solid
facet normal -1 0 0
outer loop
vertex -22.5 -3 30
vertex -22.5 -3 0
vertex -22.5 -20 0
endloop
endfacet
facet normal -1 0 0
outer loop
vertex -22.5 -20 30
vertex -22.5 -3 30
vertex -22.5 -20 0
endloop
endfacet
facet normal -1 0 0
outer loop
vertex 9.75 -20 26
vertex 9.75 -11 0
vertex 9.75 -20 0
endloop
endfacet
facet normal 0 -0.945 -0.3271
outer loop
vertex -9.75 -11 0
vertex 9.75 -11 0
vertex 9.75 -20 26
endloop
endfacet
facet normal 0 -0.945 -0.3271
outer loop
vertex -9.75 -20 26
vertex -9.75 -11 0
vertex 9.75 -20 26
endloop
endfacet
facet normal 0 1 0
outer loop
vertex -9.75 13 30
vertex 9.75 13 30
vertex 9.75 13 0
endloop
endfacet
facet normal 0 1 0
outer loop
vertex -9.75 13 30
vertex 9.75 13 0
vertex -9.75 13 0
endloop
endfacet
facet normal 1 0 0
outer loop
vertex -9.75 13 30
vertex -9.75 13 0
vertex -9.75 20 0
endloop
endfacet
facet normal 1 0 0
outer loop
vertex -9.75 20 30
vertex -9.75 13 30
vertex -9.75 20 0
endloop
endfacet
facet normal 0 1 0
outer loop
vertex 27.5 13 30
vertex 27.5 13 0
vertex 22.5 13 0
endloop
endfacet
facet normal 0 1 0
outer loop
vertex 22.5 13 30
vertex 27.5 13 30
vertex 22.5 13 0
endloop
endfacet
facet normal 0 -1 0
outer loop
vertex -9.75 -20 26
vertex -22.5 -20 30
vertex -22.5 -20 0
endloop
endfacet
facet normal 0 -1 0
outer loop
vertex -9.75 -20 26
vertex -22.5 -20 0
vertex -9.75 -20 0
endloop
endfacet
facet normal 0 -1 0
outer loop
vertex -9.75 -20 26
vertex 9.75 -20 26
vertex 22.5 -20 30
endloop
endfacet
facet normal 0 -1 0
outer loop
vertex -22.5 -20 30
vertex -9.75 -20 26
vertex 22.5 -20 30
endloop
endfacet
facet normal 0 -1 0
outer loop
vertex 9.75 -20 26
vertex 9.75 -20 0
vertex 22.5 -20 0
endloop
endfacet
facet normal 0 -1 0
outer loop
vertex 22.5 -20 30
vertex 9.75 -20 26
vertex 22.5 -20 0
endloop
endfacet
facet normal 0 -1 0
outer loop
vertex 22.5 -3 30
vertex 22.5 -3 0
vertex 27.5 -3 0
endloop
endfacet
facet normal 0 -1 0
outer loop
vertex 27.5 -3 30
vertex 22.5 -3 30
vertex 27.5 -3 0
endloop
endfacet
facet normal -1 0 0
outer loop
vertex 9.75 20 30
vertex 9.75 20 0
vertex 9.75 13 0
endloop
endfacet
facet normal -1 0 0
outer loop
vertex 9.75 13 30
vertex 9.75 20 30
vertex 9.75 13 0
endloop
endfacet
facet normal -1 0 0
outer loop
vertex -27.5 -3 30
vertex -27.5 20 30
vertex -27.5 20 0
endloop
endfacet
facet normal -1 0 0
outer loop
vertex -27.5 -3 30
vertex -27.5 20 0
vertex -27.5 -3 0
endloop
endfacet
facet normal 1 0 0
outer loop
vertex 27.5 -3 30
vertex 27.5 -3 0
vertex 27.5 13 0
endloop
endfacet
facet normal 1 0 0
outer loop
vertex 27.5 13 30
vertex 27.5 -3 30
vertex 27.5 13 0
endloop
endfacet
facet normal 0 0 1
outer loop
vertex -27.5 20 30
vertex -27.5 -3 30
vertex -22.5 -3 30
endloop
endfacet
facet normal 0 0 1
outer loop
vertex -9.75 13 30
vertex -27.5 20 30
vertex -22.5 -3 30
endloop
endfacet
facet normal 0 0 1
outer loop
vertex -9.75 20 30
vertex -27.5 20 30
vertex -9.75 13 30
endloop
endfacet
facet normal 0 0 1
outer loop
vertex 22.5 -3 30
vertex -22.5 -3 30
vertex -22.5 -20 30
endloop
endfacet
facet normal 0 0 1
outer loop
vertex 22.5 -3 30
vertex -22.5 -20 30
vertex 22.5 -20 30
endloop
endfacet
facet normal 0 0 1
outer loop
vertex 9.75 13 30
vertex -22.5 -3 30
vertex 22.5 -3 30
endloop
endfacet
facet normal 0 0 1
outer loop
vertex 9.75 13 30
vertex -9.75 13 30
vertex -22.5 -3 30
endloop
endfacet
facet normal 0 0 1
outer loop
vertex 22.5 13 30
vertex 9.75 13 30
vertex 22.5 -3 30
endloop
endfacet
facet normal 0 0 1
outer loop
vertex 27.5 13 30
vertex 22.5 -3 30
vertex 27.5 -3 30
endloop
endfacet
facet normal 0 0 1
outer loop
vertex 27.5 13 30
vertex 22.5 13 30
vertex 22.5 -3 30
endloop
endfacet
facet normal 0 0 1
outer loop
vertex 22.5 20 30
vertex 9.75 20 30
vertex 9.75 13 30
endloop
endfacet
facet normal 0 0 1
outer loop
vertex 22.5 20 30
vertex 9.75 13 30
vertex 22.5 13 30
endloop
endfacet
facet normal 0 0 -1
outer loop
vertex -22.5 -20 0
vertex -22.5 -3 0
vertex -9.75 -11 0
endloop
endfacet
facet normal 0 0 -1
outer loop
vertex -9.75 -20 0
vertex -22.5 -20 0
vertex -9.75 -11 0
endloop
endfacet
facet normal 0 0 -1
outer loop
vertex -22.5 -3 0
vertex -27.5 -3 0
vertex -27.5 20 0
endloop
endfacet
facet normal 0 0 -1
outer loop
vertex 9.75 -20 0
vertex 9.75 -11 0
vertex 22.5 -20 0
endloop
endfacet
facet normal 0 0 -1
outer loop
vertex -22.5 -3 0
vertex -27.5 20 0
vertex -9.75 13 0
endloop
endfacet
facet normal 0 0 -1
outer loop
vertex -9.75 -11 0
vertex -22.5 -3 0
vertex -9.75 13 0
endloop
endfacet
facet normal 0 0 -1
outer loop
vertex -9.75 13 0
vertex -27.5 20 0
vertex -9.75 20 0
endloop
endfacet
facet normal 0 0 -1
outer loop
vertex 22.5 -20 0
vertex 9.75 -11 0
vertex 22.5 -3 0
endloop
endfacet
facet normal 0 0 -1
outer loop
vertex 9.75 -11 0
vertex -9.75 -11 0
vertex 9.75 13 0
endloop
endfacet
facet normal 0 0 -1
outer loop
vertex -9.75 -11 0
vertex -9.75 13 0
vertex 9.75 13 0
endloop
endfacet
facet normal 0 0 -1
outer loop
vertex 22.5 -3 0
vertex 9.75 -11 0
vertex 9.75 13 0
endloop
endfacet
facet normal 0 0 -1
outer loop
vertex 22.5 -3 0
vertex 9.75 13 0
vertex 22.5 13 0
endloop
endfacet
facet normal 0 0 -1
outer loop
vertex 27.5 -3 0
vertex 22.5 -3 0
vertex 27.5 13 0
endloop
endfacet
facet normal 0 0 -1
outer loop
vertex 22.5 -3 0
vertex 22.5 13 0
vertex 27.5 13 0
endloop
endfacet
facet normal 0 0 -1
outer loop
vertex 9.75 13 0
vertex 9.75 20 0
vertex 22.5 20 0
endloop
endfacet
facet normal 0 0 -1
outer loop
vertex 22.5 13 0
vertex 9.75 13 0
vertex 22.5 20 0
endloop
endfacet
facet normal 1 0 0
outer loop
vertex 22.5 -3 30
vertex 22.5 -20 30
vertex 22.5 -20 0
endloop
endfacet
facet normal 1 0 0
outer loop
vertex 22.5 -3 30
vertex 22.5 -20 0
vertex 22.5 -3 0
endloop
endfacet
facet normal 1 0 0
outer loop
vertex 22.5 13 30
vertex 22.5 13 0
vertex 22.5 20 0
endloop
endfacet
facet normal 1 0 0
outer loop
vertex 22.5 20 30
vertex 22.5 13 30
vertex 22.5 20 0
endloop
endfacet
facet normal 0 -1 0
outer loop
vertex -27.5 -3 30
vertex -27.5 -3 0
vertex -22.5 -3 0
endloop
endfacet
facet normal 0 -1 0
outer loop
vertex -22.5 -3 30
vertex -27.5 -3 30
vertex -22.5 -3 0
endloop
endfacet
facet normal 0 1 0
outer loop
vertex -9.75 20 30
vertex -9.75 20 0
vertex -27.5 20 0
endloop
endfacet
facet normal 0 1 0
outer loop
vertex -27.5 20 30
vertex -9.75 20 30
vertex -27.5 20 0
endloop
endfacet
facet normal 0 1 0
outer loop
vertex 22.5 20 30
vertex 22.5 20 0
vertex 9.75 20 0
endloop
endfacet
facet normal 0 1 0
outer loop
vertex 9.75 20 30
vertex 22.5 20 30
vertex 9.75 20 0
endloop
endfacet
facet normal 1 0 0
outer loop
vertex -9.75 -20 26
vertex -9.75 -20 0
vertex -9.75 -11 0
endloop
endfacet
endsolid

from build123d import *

# Parameters (mm, degrees)
EXTRUDE_1_DEPTH                 = 30
CUT_EXTRUDE_1_REACH             = 47.346
CUT_EXTRUDE_1_DIRECTION_2_REACH = 47.346


with BuildPart() as part:
    # Эскиз1 → Бобышка-Вытянуть1 (new body)
    with BuildSketch(Plane.XY):
        Polygon((-22.5, -3), (-22.5, -20), (22.5, -20), (22.5, -3), (27.5, -3), (27.5, 13), (22.5, 13), (22.5, 20), (9.75, 20), (9.75, 13), (-9.75, 13), (-9.75, 20), (-27.5, 20), (-27.5, -3), align=None)
    extrude(amount=EXTRUDE_1_DEPTH)

    # Вырез-Вытянуть1: up to this face of the body (flat: up to its plane)
    cut_extrude_1_end = Plane(part.part.faces().sort_by_distance((-9.75, 16.5, 15))[0])
    # Эскиз2 → Вырез-Вытянуть1 (cut, up to the picked face)
    with BuildSketch(Plane(origin=(0, 0, 0), x_dir=(0, 0, -1), z_dir=(1, 0, 0)), mode=Mode.PRIVATE) as cut_extrude_1_sk1:
        Polygon((0, -20), (0, -11), (-26, -20), align=None)
    cut_extrude_1_tool1 = split(extrude(cut_extrude_1_sk1.sketch, amount=-CUT_EXTRUDE_1_REACH, mode=Mode.PRIVATE), bisect_by=cut_extrude_1_end, keep=Keep.BOTH, mode=Mode.PRIVATE)
    add(cut_extrude_1_tool1.solids().sort_by(Axis((0, -17, 8.666667), (-1, 0, 0)))[0], mode=Mode.SUBTRACT)

    # Вырез-Вытянуть1 direction 2: up to this face of the body (flat: up to its plane)
    cut_extrude_1_direction_2_end = Plane(part.part.faces().sort_by_distance((9.75, 16.5, 15))[0])
    # Эскиз2 → Вырез-Вытянуть1 direction 2 (cut, up to the picked face)
    with BuildSketch(Plane(origin=(0, 0, 0), x_dir=(0, 0, -1), z_dir=(1, 0, 0)), mode=Mode.PRIVATE) as cut_extrude_1_direction_2_sk1:
        Polygon((0, -20), (0, -11), (-26, -20), align=None)
    cut_extrude_1_direction_2_tool1 = split(extrude(cut_extrude_1_direction_2_sk1.sketch, amount=CUT_EXTRUDE_1_DIRECTION_2_REACH, mode=Mode.PRIVATE), bisect_by=cut_extrude_1_direction_2_end, keep=Keep.BOTH, mode=Mode.PRIVATE)
    add(cut_extrude_1_direction_2_tool1.solids().sort_by(Axis((0, -17, 8.666667), (1, 0, 0)))[0], mode=Mode.SUBTRACT)


solid = part.part
